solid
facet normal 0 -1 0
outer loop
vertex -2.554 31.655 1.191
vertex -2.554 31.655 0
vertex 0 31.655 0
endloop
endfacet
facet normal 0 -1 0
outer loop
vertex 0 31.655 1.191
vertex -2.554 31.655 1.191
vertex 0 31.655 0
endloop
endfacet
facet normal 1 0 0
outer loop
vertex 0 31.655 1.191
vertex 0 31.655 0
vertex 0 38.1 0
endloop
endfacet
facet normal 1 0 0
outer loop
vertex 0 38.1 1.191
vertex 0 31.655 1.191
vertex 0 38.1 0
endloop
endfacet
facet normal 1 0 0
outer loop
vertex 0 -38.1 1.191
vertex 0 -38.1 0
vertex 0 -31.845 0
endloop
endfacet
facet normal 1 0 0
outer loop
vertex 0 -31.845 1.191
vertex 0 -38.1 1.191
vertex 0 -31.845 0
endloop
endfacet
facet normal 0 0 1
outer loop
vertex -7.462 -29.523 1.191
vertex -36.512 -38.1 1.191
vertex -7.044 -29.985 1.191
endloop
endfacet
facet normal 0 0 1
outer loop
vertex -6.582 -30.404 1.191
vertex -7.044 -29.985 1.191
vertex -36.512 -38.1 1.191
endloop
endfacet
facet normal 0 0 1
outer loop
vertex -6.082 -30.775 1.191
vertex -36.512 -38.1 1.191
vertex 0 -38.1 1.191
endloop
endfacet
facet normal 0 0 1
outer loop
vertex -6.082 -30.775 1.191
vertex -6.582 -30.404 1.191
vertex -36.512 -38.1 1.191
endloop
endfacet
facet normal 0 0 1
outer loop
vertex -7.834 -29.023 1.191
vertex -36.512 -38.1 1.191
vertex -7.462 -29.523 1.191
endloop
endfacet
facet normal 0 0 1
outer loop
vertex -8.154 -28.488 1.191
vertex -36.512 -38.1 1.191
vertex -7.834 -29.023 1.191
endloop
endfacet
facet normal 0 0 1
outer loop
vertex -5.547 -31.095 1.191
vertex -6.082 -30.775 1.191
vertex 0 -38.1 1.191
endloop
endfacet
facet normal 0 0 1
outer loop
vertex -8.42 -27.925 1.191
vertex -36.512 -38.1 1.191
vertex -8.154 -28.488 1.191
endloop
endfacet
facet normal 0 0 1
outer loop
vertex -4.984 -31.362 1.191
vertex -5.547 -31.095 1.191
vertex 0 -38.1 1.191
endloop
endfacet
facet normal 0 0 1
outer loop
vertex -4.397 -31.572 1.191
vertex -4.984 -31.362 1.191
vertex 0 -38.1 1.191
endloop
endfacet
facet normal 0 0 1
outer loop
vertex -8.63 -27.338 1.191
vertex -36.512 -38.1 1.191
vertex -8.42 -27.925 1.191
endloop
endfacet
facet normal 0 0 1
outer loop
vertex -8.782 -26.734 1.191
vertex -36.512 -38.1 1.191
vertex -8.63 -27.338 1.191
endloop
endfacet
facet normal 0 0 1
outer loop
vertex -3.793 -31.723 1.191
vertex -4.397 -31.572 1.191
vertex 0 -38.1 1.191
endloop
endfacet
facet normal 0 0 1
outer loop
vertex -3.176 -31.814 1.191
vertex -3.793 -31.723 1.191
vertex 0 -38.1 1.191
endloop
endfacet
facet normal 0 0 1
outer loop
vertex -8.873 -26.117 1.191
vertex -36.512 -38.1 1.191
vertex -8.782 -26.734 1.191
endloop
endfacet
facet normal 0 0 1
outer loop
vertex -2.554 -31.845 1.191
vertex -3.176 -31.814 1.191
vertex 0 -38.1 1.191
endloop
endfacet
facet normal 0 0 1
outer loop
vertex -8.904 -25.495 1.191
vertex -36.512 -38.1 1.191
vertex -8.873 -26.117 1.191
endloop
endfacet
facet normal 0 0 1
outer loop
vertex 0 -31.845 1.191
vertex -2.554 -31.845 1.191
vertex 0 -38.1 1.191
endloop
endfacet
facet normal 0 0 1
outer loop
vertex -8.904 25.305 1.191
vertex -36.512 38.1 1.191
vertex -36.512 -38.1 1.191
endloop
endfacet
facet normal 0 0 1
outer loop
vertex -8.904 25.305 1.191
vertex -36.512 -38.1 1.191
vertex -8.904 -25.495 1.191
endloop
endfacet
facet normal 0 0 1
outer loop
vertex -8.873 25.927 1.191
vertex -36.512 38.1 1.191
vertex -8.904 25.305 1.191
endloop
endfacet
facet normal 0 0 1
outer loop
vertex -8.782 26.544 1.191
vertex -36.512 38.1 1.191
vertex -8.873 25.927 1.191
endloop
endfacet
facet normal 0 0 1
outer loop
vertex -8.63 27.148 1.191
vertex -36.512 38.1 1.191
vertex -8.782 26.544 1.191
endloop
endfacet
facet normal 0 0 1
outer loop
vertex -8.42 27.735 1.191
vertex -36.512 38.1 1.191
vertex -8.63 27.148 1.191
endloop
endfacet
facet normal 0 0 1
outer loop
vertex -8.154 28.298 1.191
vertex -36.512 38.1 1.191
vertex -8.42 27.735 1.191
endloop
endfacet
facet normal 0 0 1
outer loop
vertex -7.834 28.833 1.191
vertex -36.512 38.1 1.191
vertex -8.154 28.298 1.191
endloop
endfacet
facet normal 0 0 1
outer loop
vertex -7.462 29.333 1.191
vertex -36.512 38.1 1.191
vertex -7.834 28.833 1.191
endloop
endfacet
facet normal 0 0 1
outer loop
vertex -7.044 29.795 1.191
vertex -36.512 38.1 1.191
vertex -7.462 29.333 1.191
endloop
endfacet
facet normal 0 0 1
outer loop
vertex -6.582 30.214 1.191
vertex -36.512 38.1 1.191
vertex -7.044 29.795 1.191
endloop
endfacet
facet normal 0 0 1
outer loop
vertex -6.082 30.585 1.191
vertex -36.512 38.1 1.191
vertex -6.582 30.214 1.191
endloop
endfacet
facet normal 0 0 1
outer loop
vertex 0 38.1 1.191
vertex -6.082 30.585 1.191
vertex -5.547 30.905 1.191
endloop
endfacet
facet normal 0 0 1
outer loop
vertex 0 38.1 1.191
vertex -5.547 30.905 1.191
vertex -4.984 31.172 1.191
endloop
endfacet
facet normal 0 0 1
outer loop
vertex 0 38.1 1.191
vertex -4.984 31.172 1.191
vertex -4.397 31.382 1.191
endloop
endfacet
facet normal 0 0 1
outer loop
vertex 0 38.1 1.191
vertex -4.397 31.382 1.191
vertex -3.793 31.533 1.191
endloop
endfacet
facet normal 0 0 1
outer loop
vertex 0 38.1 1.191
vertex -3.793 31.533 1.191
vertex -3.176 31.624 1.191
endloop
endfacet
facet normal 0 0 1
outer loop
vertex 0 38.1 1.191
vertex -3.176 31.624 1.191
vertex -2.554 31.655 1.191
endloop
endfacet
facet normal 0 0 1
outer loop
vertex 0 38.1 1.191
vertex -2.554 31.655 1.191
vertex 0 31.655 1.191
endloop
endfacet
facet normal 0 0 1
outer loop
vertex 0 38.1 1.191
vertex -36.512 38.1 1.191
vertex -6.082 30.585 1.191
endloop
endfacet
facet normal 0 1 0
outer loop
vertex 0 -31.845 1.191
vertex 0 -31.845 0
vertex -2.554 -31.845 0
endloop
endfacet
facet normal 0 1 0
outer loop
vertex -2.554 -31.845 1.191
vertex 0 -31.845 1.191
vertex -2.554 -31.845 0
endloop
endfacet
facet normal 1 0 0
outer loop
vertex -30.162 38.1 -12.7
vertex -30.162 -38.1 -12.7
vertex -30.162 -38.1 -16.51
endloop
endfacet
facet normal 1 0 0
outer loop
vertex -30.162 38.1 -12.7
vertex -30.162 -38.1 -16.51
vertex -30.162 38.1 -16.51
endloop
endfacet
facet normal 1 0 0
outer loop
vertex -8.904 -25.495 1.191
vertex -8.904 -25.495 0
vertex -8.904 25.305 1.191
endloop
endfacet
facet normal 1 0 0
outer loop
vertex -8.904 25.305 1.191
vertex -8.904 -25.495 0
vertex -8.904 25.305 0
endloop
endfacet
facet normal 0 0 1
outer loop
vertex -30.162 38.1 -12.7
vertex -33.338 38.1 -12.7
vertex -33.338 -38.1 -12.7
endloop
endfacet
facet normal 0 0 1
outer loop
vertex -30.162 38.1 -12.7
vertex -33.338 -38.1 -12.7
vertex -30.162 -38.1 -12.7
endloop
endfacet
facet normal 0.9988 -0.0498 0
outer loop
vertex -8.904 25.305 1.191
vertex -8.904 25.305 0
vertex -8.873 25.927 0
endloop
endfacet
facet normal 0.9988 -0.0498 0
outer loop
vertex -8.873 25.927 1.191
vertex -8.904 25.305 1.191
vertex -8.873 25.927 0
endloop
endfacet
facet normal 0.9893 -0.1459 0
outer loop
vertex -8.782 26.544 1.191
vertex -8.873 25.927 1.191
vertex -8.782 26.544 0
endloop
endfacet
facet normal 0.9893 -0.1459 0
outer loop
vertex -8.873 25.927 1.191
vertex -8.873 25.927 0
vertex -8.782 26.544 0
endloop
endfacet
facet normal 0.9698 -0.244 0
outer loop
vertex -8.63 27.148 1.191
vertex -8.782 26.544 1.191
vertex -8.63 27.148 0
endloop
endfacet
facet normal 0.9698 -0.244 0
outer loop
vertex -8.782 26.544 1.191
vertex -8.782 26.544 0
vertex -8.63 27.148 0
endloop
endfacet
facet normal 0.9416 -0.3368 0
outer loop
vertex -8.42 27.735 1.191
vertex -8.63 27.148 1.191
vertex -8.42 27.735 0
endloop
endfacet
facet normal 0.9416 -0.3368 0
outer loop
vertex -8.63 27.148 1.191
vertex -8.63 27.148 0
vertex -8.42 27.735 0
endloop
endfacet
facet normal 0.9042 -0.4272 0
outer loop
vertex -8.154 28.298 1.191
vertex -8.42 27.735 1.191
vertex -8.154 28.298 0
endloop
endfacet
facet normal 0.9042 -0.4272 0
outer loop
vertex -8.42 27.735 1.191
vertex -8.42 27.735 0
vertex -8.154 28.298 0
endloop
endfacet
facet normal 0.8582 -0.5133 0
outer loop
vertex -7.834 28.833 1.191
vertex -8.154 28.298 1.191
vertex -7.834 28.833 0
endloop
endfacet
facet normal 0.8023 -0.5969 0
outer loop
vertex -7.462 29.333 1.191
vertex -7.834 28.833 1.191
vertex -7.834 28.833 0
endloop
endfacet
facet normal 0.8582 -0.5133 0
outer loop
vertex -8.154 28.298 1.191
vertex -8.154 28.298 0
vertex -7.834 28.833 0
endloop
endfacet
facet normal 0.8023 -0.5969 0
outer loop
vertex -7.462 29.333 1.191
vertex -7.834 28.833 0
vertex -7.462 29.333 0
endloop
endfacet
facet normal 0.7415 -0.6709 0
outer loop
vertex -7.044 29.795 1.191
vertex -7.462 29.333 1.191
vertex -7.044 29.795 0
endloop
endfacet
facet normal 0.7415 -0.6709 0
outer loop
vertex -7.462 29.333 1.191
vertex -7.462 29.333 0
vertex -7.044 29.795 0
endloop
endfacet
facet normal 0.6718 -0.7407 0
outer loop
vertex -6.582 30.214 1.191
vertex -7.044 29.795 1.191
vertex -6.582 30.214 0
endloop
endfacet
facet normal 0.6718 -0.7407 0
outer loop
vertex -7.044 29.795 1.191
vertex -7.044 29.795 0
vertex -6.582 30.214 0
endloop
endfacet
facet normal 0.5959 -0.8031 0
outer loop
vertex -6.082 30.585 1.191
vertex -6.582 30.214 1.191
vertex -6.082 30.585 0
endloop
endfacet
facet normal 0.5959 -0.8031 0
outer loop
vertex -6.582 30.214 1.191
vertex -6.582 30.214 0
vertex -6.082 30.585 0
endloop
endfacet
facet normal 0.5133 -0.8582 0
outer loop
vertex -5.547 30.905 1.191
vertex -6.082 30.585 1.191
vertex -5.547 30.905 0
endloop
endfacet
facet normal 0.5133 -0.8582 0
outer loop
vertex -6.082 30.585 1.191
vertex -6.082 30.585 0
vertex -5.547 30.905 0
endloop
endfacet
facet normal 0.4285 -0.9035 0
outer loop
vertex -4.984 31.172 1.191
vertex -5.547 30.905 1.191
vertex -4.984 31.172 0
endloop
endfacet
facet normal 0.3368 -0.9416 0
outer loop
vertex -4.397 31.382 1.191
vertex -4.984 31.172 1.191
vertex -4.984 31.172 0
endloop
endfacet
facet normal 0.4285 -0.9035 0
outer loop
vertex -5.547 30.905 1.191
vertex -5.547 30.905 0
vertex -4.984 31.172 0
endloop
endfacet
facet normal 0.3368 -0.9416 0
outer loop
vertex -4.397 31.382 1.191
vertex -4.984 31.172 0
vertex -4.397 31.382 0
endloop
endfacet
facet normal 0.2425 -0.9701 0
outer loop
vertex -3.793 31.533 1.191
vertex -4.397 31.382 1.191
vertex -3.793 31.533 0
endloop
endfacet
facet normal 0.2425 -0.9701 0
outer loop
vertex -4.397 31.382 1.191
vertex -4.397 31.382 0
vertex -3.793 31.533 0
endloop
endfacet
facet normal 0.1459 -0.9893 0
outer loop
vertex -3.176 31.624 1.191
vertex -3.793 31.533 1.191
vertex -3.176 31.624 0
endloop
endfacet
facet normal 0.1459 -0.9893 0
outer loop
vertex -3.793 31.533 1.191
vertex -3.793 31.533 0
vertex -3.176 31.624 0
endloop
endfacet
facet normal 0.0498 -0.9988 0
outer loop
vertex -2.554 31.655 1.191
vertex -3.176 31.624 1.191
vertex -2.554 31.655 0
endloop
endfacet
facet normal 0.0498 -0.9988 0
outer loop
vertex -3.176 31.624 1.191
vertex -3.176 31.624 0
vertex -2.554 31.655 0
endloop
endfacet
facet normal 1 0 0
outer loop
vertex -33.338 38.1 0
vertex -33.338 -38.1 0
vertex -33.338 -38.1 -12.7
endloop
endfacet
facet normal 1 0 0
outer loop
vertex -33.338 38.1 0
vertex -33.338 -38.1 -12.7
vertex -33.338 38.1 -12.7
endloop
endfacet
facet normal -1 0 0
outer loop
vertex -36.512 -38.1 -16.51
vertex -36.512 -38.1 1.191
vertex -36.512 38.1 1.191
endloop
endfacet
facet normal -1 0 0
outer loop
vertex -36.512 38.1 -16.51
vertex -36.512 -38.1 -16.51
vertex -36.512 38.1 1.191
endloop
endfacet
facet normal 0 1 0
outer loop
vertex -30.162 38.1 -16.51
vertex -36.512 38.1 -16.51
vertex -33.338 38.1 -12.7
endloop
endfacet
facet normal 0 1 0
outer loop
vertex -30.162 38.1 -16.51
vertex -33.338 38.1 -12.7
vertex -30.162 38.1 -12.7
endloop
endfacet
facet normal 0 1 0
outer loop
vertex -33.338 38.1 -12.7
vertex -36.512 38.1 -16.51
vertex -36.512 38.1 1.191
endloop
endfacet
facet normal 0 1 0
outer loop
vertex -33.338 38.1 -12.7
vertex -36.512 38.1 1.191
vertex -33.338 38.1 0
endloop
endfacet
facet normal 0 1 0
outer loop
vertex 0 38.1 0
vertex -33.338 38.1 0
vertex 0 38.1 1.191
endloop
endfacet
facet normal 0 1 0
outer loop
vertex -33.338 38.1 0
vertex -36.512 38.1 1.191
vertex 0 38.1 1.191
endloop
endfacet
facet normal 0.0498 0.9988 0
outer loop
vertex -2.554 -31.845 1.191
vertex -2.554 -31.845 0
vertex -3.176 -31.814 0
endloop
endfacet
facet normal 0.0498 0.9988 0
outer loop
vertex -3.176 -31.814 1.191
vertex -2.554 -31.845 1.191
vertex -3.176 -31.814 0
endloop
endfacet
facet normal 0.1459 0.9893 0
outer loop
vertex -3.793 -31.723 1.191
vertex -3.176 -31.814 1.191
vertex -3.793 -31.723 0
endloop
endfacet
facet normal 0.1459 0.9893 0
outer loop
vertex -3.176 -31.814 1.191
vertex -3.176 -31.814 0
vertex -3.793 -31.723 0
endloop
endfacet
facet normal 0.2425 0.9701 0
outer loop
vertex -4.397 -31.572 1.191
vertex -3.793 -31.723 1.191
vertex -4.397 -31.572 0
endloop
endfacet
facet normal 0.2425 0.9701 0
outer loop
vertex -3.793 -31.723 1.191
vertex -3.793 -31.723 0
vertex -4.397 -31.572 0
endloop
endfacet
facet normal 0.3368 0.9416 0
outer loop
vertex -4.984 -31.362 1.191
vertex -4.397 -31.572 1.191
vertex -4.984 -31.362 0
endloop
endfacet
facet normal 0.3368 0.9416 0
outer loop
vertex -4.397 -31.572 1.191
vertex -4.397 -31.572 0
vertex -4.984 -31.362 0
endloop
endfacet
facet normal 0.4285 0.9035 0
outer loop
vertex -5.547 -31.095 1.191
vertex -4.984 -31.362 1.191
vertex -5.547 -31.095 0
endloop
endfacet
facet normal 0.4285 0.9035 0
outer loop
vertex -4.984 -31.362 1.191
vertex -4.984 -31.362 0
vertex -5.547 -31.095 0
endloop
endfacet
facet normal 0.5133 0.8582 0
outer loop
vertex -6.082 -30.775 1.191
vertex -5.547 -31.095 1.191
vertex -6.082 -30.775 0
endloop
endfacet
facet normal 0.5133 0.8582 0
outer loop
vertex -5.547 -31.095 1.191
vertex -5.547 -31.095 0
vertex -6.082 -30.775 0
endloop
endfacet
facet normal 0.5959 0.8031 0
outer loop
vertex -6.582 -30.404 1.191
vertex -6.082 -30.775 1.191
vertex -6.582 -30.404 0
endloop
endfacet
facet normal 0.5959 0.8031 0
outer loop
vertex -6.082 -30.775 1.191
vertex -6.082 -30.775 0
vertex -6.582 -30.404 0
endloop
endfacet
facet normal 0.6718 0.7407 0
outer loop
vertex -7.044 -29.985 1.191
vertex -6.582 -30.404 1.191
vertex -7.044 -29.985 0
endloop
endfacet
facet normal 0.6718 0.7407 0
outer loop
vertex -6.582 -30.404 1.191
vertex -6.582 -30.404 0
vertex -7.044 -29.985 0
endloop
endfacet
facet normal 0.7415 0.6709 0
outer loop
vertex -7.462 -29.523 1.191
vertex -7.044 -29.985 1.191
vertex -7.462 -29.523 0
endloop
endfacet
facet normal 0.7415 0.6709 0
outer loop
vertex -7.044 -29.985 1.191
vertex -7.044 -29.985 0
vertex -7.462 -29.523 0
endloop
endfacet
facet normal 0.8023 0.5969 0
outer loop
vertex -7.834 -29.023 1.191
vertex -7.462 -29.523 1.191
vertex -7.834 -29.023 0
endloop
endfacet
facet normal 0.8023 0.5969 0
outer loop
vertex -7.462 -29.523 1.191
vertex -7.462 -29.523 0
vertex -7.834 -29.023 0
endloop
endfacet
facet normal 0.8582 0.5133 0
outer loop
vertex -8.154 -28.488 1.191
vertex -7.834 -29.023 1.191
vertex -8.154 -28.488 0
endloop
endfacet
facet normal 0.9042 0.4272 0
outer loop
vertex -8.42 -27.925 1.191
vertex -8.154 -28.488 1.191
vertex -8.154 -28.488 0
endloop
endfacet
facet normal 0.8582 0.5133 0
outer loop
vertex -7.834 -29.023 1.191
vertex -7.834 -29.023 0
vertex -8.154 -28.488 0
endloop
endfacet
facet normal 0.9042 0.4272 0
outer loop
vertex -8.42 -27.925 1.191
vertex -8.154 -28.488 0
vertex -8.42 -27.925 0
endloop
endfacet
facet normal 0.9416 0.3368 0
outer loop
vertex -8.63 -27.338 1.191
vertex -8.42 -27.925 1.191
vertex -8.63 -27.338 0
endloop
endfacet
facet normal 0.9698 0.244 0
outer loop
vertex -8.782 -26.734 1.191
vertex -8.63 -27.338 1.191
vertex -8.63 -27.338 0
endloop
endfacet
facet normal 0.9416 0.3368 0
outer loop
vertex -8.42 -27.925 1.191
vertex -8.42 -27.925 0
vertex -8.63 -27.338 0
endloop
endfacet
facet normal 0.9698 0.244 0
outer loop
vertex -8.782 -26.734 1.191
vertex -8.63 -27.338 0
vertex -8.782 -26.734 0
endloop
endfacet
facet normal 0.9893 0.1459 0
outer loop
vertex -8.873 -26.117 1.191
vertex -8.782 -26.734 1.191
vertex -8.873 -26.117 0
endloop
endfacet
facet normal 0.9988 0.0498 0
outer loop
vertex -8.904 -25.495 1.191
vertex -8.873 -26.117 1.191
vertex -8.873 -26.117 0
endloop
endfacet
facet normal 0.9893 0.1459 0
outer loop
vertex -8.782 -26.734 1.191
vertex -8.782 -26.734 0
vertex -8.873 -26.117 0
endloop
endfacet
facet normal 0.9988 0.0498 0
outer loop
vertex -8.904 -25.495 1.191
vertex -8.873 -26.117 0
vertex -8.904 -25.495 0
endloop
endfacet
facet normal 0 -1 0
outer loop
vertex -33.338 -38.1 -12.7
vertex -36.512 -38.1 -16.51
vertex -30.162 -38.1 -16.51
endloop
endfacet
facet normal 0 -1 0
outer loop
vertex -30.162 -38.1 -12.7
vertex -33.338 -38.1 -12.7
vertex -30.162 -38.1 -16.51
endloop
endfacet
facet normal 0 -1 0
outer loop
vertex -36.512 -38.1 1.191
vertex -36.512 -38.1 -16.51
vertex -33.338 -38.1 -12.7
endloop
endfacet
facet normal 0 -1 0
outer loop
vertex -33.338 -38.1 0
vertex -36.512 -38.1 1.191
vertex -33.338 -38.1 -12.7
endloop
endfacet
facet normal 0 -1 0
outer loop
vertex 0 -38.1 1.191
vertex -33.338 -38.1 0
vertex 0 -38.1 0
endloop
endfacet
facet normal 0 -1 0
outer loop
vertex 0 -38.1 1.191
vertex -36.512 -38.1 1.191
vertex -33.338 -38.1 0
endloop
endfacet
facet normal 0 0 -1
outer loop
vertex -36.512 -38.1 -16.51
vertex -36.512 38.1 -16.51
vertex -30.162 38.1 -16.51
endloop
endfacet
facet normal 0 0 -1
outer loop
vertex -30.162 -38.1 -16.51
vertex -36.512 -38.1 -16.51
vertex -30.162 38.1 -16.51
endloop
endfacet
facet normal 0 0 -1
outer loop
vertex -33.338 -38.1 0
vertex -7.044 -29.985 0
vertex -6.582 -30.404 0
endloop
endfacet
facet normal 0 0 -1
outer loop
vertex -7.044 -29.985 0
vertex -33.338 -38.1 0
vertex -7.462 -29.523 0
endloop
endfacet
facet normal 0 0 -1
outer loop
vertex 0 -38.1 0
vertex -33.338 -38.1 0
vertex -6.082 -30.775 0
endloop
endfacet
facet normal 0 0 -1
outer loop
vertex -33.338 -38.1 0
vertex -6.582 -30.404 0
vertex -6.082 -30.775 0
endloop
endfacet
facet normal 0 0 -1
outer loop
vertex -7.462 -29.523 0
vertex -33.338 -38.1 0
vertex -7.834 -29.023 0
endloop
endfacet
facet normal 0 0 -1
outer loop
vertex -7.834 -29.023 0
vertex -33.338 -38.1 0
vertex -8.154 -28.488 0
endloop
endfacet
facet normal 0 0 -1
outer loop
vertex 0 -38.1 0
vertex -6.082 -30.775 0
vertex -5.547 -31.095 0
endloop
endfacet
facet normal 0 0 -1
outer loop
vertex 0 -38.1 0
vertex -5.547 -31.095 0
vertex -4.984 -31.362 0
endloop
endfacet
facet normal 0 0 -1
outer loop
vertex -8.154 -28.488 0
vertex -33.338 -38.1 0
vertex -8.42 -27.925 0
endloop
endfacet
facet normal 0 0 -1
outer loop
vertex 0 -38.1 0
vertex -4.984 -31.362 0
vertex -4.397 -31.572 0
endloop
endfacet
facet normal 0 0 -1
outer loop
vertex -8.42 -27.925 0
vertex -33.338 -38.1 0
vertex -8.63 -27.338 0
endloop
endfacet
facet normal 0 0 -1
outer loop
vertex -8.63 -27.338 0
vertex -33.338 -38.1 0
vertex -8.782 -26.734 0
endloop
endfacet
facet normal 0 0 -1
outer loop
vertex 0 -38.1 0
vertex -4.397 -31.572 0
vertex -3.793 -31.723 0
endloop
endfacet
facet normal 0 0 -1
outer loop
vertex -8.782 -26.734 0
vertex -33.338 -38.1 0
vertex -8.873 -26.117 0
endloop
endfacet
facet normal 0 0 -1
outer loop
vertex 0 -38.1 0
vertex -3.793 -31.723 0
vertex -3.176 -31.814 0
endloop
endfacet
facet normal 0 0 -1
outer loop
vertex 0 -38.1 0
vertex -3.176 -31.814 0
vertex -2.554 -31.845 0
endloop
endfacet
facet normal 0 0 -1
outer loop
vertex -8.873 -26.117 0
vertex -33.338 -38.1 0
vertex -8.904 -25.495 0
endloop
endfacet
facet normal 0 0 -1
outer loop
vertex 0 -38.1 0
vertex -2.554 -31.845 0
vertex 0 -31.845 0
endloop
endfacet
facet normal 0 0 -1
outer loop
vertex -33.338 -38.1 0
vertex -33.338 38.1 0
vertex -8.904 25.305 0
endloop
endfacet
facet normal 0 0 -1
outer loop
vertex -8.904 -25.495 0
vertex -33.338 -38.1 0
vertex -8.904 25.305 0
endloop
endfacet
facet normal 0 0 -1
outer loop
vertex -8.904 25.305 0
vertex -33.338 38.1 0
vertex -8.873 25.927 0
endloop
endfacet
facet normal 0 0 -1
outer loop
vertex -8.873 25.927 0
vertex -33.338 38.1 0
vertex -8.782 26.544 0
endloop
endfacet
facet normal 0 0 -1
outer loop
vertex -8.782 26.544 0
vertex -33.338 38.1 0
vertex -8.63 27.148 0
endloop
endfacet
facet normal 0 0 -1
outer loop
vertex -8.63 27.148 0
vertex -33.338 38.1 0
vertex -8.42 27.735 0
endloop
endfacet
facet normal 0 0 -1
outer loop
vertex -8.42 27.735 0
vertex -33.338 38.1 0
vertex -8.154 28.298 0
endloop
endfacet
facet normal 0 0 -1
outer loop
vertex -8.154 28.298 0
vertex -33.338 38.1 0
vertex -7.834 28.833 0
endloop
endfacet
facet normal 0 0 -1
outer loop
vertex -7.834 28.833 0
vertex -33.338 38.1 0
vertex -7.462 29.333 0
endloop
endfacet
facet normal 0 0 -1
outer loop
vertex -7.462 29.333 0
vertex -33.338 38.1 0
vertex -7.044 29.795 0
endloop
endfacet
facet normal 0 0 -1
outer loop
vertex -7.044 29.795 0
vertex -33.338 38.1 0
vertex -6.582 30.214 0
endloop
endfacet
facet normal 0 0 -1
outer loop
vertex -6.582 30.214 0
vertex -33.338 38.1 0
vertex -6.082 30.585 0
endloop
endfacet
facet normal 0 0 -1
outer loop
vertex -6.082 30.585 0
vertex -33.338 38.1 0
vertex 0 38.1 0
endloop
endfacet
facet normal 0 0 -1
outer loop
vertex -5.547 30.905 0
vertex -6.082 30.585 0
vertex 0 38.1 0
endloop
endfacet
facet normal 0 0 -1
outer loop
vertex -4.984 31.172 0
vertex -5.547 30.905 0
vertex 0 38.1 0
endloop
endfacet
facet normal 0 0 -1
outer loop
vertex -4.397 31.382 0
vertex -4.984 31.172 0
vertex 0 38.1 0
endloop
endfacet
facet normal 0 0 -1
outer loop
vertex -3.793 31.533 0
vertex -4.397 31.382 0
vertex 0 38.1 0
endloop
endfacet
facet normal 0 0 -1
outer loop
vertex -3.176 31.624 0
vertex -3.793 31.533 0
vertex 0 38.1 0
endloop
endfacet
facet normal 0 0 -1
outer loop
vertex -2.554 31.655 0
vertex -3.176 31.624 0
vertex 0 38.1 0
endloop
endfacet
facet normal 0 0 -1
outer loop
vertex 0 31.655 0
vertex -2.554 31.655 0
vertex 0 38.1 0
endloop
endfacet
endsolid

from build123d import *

# Parameters (mm, degrees)
F0_W     = 3.175
F0_H     = 76.2
F1_DEPTH = 1.190625
F2_DEPTH = 16.51
F3_START = -12.7
F3_DEPTH = 3.81


# Not quite as in the source:
# - a length typed as a fraction of an inch, garbled in the dataset ("3 / 203.2 mm" for 3/8 in), is restored


with BuildPart() as f1:
    # F0 (on Top) → F1 (new body)
    with BuildSketch(Plane.XY):
        with Locations((-34.925, 0)):
            Rectangle(F0_W, F0_H)
        with BuildLine():
            Line((-30.1625, 38.1), (-30.1625, -38.1))
            Line((-30.1625, -38.1), (0, -38.1))
            Line((0, -38.1), (0, -31.8450108171))
            Line((0, -31.8450108171), (-2.553815411, -31.8450108171))
            ThreePointArc((-2.553815411, -31.8450108171), (-7.0439434716, -29.9851388776), (-8.903815411, -25.4950108171))
            Line((-8.903815411, -25.4950108171), (-8.903815411, 25.3049891829))
            ThreePointArc((-8.903815411, 25.3049891829), (-7.0439434716, 29.7951172435), (-2.553815411, 31.6549891829))
            Line((-2.553815411, 31.6549891829), (0, 31.6549891829))
            Line((0, 31.6549891829), (0, 38.1))
            Line((0, 38.1), (-30.1625, 38.1))
        make_face()
        with Locations((-31.75, 0)):
            Rectangle(F0_W, F0_H)
    extrude(amount=F1_DEPTH)

    # F0 (on Top) → F2 (join)
    with BuildSketch(Plane.XY):
        with Locations((-34.925, 0)):
            Rectangle(F0_W, F0_H)
    extrude(amount=-F2_DEPTH)

    # F0 (on Top) → F3 (join)
    with BuildSketch(Plane.XY.offset(F3_START)):
        with Locations((-34.925, 0)):
            Rectangle(F0_W, F0_H)
        with Locations((-31.75, 0)):
            Rectangle(F0_W, F0_H)
    extrude(amount=-F3_DEPTH)


solid = f1.part
